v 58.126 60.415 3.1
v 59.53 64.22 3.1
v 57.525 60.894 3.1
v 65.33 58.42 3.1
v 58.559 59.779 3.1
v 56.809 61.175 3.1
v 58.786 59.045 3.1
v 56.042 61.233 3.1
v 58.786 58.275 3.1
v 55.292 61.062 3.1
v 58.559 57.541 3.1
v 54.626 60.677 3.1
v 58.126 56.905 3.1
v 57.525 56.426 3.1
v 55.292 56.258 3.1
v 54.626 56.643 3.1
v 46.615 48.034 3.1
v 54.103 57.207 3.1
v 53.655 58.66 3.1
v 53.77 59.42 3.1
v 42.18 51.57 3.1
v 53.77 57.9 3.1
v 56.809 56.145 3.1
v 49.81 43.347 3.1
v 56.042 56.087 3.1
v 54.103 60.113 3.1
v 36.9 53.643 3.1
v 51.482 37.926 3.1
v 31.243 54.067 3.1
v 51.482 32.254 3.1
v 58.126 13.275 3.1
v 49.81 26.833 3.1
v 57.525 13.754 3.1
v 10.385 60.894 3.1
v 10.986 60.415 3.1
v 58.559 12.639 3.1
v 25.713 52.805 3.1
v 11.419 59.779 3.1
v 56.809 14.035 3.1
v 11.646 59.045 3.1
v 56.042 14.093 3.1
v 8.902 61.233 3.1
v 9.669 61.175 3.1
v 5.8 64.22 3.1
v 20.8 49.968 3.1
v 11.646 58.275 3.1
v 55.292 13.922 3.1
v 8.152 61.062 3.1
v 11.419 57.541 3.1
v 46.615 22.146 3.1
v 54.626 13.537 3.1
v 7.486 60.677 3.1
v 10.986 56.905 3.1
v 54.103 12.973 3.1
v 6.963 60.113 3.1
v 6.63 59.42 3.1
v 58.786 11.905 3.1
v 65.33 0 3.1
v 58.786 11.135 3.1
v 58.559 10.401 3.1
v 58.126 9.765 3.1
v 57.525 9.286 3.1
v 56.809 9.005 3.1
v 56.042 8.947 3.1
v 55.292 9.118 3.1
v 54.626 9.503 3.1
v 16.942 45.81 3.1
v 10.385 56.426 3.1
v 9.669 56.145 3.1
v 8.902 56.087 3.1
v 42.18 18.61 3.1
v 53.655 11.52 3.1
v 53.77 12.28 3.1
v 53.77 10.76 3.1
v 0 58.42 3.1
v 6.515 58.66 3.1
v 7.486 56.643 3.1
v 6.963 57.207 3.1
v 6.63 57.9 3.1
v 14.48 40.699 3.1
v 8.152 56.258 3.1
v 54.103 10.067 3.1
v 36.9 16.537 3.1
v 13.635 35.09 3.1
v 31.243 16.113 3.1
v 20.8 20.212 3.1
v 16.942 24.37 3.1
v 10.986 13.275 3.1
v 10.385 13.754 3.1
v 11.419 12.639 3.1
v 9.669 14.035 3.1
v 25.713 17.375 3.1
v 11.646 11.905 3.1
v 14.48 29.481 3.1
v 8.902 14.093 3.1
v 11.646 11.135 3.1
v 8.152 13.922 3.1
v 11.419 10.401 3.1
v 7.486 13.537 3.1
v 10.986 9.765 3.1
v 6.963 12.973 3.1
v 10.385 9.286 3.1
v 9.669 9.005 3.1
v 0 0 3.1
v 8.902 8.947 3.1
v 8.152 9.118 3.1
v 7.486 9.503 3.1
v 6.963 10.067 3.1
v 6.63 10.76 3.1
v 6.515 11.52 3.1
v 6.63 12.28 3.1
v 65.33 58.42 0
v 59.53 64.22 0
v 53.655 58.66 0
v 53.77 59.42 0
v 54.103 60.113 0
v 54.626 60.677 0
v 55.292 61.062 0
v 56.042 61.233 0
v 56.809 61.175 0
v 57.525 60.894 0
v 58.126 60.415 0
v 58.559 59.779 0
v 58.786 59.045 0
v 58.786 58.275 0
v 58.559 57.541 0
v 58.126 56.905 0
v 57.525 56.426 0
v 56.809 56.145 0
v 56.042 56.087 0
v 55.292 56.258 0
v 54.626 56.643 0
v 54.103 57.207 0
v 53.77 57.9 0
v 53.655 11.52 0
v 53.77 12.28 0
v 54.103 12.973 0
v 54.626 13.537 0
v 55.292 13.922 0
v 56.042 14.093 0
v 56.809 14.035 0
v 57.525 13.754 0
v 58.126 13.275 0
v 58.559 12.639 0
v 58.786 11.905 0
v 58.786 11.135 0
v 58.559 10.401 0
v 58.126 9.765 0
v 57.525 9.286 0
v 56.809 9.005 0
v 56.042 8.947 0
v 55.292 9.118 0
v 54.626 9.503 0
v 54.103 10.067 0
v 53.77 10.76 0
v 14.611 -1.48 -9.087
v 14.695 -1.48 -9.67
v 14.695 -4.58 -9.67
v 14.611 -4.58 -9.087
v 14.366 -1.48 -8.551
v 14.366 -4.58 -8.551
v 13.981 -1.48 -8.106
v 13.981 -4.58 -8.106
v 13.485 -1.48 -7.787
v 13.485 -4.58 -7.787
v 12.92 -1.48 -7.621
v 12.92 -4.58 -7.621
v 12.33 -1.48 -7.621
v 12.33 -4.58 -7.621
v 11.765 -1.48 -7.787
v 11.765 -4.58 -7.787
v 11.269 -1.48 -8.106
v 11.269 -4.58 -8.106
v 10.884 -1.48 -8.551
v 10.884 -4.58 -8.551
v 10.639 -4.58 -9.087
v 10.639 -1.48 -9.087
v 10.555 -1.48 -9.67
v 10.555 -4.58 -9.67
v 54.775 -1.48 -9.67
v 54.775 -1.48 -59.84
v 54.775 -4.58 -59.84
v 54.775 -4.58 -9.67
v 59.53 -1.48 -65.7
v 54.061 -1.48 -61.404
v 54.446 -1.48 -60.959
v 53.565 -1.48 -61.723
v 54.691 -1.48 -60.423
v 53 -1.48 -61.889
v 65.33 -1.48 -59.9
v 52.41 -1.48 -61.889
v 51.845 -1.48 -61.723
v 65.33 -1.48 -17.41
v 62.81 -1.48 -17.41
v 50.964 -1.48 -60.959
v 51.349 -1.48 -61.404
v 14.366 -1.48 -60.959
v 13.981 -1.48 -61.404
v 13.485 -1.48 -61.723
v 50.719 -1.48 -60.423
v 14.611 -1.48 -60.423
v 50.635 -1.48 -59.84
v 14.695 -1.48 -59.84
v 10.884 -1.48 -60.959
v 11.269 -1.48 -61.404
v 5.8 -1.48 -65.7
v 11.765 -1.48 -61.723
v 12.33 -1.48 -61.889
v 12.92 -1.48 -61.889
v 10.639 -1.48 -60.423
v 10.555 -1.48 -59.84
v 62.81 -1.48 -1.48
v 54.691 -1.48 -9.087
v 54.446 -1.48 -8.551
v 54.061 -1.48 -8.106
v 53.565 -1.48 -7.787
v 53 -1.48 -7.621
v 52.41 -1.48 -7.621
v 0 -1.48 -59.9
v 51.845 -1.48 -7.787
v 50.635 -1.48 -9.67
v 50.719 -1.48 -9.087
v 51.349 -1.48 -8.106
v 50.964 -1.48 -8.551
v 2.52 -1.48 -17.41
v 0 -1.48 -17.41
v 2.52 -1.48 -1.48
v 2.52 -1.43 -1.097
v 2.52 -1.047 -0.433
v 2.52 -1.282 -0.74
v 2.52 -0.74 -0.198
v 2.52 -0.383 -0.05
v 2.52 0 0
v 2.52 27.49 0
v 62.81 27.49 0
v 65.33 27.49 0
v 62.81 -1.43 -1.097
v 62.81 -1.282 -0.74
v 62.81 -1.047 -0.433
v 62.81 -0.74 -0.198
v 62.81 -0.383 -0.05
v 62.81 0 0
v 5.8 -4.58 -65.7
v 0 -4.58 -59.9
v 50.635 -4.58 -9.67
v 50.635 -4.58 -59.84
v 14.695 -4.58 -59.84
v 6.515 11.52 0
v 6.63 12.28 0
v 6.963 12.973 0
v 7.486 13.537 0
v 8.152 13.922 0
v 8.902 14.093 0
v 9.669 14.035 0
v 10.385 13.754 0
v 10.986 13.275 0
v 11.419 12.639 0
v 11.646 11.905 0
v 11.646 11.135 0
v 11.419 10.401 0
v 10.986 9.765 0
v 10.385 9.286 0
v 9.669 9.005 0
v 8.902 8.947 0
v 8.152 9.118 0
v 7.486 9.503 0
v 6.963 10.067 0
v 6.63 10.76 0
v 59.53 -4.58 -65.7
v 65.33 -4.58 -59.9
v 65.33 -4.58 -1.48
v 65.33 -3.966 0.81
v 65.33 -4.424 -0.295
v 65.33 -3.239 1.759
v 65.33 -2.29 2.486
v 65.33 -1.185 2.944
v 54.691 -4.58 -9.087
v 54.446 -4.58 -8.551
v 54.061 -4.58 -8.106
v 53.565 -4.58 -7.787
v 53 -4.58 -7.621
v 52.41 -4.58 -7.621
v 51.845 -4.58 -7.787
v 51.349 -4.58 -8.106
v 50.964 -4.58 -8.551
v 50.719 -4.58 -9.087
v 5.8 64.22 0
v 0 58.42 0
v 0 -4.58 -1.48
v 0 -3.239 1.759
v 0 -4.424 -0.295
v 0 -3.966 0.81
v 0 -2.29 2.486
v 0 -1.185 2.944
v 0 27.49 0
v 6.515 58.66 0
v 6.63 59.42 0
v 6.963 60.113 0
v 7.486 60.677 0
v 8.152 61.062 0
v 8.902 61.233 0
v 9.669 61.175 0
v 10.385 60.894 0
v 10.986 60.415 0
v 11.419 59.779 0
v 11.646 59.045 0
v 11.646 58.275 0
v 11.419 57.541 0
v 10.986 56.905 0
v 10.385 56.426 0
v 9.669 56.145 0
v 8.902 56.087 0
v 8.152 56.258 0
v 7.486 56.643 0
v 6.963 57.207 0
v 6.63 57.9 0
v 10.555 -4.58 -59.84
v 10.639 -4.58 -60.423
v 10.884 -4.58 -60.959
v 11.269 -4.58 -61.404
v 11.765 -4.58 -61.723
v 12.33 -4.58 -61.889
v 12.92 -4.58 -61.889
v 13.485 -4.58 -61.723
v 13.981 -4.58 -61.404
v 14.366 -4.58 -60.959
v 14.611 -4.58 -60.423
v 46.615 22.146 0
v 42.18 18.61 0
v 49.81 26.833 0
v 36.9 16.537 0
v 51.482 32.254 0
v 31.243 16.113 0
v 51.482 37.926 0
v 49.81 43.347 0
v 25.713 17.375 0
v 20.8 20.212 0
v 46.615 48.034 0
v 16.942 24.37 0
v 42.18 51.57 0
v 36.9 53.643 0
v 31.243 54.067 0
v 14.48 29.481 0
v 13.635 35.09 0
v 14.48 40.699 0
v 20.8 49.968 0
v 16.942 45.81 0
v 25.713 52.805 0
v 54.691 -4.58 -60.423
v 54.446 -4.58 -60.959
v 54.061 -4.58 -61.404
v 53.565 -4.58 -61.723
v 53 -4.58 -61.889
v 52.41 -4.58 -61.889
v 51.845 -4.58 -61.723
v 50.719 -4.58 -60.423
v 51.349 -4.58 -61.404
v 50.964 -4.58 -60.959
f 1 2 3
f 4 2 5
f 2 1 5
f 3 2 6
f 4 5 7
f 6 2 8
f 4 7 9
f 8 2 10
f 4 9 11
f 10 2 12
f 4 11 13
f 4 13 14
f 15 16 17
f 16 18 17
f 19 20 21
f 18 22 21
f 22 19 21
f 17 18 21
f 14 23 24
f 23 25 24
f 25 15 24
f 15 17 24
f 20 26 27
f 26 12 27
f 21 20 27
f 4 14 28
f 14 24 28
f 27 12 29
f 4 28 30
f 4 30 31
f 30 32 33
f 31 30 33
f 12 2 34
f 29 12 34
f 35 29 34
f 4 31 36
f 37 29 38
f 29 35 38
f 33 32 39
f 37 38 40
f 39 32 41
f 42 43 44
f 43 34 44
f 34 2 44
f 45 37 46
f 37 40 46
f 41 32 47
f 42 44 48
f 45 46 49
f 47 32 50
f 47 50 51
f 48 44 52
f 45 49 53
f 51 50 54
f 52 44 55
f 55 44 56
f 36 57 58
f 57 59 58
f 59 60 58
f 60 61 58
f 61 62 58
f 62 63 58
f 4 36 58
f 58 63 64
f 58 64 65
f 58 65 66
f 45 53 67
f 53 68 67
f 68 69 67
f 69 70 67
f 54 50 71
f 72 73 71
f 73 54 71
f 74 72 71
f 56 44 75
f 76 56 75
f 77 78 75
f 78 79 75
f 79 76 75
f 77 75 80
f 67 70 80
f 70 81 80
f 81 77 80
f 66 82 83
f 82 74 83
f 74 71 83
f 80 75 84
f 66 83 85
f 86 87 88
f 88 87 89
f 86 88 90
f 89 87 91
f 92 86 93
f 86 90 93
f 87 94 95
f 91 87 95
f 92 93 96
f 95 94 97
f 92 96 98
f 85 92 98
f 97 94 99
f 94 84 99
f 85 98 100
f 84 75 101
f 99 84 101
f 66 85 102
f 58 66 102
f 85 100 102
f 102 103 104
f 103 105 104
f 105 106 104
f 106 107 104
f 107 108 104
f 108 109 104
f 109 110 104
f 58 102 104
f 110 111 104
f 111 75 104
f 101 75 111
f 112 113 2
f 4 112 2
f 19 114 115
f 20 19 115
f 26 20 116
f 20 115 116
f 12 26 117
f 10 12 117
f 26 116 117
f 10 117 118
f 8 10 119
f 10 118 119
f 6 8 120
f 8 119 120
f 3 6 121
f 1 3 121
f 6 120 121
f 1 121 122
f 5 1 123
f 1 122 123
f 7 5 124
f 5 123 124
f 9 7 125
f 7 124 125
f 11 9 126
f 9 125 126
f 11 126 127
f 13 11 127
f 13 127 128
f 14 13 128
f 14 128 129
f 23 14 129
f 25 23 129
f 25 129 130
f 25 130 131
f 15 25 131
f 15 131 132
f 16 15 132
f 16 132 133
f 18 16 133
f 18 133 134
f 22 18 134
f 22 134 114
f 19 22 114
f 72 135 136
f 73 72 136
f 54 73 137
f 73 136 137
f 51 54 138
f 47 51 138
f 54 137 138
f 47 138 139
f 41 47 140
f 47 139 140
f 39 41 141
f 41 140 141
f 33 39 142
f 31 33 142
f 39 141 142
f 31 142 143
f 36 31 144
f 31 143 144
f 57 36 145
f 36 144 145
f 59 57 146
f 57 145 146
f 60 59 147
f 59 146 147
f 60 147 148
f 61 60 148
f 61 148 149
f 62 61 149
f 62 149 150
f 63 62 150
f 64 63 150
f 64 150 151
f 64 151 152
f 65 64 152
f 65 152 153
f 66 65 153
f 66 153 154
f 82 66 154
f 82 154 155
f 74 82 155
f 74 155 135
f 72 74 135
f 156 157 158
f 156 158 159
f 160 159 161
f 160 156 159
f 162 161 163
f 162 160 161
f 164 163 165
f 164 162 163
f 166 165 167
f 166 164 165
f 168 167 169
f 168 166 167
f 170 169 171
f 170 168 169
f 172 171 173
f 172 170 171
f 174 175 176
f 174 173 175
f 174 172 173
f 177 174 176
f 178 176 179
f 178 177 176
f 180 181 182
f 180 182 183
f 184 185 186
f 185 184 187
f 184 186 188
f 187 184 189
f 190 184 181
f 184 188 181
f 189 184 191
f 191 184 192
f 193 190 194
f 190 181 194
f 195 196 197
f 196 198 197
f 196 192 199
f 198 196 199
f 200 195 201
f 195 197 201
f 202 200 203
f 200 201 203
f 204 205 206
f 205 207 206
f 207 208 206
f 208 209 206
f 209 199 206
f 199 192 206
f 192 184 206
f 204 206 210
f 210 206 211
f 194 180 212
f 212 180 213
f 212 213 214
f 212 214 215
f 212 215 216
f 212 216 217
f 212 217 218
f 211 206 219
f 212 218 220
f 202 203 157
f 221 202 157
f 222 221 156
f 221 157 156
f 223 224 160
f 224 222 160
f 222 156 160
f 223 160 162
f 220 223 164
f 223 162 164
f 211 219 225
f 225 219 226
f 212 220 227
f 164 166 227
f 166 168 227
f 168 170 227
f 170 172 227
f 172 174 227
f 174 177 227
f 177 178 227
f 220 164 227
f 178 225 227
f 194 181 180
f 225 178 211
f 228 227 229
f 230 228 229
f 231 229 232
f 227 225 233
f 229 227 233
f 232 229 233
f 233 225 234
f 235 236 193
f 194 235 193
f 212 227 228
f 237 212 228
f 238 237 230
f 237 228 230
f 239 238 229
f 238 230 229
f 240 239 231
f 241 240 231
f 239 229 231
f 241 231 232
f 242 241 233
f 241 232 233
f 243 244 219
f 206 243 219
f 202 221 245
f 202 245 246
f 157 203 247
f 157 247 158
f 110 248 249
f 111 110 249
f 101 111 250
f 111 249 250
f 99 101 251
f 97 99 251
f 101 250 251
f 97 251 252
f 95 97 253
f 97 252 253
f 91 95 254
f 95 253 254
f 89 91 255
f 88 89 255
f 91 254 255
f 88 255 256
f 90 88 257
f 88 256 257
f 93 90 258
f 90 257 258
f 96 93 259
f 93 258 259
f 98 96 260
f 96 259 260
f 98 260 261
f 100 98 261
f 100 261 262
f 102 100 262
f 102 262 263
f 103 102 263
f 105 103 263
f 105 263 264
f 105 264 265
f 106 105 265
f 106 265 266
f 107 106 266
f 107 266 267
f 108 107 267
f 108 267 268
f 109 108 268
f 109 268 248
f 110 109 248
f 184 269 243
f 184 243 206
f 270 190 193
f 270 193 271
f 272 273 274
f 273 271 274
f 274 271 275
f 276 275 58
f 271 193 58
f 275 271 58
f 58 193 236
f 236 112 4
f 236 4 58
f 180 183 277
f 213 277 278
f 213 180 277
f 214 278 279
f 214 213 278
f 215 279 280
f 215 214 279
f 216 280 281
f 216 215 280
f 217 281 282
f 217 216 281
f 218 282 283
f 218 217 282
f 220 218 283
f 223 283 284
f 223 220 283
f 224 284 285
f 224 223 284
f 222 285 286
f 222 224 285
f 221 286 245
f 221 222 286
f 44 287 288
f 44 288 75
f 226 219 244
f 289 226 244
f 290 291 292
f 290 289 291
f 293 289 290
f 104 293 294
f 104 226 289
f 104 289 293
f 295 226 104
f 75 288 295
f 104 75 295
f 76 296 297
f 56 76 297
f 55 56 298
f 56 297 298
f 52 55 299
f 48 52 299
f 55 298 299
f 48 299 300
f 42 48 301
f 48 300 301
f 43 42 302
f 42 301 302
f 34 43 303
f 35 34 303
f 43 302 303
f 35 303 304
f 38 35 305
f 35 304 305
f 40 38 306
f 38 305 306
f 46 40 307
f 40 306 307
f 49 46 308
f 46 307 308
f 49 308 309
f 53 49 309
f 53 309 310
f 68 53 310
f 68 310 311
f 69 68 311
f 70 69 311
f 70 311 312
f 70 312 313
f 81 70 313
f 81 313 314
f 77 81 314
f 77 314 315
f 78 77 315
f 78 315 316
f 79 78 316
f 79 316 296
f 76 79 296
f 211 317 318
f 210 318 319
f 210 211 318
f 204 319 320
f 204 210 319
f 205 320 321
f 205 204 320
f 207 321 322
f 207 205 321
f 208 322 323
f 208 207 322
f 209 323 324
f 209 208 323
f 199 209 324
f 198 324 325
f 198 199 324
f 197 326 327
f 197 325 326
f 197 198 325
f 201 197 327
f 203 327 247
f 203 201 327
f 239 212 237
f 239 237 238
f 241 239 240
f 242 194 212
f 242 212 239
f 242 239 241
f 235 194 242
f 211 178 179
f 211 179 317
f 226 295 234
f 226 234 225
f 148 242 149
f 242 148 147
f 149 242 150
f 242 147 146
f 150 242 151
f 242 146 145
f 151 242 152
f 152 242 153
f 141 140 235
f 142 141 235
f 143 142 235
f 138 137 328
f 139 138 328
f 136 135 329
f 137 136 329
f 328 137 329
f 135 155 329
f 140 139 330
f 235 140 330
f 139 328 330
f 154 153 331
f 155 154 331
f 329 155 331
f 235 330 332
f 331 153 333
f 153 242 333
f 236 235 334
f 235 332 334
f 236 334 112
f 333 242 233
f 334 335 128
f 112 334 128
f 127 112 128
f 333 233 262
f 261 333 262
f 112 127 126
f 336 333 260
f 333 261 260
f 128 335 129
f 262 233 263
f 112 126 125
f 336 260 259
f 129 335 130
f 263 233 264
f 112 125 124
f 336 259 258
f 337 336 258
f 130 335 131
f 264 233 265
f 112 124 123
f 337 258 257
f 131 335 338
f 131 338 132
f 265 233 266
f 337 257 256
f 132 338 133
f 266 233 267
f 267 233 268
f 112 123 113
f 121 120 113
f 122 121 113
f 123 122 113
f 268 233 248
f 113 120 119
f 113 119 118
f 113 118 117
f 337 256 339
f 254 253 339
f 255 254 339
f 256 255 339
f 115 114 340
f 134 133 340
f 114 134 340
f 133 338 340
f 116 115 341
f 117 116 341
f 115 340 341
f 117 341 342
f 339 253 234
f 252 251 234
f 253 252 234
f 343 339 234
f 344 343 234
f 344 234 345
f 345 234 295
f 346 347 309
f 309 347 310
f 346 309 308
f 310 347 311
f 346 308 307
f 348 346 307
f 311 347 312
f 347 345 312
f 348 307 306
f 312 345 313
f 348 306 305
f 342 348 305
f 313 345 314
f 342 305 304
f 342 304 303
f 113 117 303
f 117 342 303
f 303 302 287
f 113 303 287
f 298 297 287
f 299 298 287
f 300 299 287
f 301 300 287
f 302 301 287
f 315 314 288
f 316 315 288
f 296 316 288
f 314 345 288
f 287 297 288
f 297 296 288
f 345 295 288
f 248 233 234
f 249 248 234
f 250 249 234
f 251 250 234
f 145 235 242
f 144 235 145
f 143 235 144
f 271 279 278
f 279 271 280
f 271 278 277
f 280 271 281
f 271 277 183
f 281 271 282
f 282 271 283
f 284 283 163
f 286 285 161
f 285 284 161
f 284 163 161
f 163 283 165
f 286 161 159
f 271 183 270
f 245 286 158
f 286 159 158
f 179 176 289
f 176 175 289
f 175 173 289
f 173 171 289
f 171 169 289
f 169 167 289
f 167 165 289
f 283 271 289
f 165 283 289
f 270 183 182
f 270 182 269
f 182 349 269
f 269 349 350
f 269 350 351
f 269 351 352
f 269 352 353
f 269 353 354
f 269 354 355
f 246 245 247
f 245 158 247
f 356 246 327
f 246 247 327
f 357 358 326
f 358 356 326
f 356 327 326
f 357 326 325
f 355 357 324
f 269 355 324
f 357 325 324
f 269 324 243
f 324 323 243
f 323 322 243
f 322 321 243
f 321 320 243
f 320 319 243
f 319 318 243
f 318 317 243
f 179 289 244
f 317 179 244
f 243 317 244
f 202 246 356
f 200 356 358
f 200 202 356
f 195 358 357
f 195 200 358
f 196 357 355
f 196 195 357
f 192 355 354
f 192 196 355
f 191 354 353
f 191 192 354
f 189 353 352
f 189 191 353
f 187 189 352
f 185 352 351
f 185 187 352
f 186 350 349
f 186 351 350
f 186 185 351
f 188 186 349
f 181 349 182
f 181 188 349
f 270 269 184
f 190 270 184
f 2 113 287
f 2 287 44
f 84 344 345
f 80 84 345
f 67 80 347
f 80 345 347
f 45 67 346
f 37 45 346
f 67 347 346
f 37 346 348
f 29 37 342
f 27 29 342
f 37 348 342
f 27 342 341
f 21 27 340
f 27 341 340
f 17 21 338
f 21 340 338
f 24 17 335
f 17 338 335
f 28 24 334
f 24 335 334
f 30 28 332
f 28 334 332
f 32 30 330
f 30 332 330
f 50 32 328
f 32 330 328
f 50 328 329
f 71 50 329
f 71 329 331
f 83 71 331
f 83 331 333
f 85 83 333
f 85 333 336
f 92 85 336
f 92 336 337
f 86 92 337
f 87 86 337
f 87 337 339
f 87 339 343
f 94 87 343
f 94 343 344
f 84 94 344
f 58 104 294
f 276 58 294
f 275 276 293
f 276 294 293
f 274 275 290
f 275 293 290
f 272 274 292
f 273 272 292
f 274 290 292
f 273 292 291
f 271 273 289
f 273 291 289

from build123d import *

# Parameters (mm, degrees)
BOSS_EXTRUDE1_DEPTH     = 65.33
CHAMFER1_SIZE           = 5.8
BOSS_EXTRUDE2_DEPTH     = 2.52
BOSS_EXTRUDE3_DEPTH     = 2.52
SKETCH4_R               = 19.03
SKETCH4_R_2             = 2.58
CUT_EXTRUDE1_DEPTH      = 4.1
CUT_EXTRUDE2_DEPTH      = 66.7
CUT_EXTRUDE2_DEPTH_BACK = 4.1


with BuildPart() as part:
    # Sketch1 → Boss-Extrude1 (new body)
    with BuildSketch(Plane(origin=(0, 0, 0), x_dir=(0, 0, -1), z_dir=(1, 0, 0))):
        with BuildLine():
            Line((0, 0), (0, 64.22))
            Line((0, 64.22), (-3.1, 64.22))
            Line((-3.1, 64.22), (-3.1, 0))
            ThreePointArc((-3.1, 0), (-1.758549058, -3.238549058), (1.48, -4.58))
            Line((1.48, -4.58), (65.7, -4.58))
            Line((65.7, -4.58), (65.7, -1.48))
            Line((65.7, -1.48), (1.48, -1.48))
            ThreePointArc((1.48, -1.48), (0.433481964, -1.046518036), (0, 0))
        make_face()
    extrude(amount=BOSS_EXTRUDE1_DEPTH)

    # Chamfer1
    chamfer1_edges = [part.edges().sort_by_distance(p)[0] for p in [
        (65.33, 64.22, 1.55),
        (65.33, -3.03, -65.7),
        (0, -3.03, -65.7),
        (0, 64.22, 1.55),
    ]]
    chamfer(chamfer1_edges, length=CHAMFER1_SIZE)

    # Sketch2 → Boss-Extrude2 (add)
    with BuildSketch(Plane(origin=(65.33, 0, 0), x_dir=(0, 0, -1), z_dir=(1, 0, 0))):
        Polygon((0, 27.49), (17.41, -1.48), (0, -1.48), align=None)
    extrude(amount=-BOSS_EXTRUDE2_DEPTH)

    # Sketch3 → Boss-Extrude3 (add)
    with BuildSketch(Plane.ZY):
        Polygon((0, 27.49), (-17.41, -1.48), (0, -1.48), align=None)
    extrude(amount=-BOSS_EXTRUDE3_DEPTH)

    # Sketch4 → Cut-Extrude1 (cut, through all)
    with BuildSketch(Plane(origin=(0, 0, 0), x_dir=(-1, 0, 0), z_dir=(0, 0, -1))):
        with Locations((-32.665, 35.09)):
            Circle(SKETCH4_R)
        with Locations((-56.235, 58.66)):
            Circle(SKETCH4_R_2)
        with Locations((-9.095, 58.66)):
            Circle(SKETCH4_R_2)
        with Locations((-9.095, 11.52)):
            Circle(SKETCH4_R_2)
        with Locations((-56.235, 11.52)):
            Circle(SKETCH4_R_2)
    extrude(amount=-CUT_EXTRUDE1_DEPTH, mode=Mode.SUBTRACT)

    # Sketch5 → Cut-Extrude2 (cut, two sides)
    with BuildSketch(Plane(origin=(0, -1.48, 0), x_dir=(1, 0, 0), z_dir=(0, 1, 0))) as cut_extrude2_sk:
        with BuildLine():
            Line((50.635, 9.67), (50.635, 59.84))
            ThreePointArc((50.635, 59.84), (52.705, 61.91), (54.775, 59.84))
            Line((54.775, 59.84), (54.775, 9.67))
            ThreePointArc((54.775, 9.67), (52.705, 7.6), (50.635, 9.67))
        make_face()
        with BuildLine():
            Line((10.555, 9.67), (10.555, 59.84))
            ThreePointArc((10.555, 59.84), (12.625, 61.91), (14.695, 59.84))
            Line((14.695, 59.84), (14.695, 9.67))
            ThreePointArc((14.695, 9.67), (12.625, 7.6), (10.555, 9.67))
        make_face()
    extrude(amount=CUT_EXTRUDE2_DEPTH, mode=Mode.SUBTRACT)
    extrude(cut_extrude2_sk.sketch, amount=-CUT_EXTRUDE2_DEPTH_BACK, mode=Mode.SUBTRACT)


solid = part.part
